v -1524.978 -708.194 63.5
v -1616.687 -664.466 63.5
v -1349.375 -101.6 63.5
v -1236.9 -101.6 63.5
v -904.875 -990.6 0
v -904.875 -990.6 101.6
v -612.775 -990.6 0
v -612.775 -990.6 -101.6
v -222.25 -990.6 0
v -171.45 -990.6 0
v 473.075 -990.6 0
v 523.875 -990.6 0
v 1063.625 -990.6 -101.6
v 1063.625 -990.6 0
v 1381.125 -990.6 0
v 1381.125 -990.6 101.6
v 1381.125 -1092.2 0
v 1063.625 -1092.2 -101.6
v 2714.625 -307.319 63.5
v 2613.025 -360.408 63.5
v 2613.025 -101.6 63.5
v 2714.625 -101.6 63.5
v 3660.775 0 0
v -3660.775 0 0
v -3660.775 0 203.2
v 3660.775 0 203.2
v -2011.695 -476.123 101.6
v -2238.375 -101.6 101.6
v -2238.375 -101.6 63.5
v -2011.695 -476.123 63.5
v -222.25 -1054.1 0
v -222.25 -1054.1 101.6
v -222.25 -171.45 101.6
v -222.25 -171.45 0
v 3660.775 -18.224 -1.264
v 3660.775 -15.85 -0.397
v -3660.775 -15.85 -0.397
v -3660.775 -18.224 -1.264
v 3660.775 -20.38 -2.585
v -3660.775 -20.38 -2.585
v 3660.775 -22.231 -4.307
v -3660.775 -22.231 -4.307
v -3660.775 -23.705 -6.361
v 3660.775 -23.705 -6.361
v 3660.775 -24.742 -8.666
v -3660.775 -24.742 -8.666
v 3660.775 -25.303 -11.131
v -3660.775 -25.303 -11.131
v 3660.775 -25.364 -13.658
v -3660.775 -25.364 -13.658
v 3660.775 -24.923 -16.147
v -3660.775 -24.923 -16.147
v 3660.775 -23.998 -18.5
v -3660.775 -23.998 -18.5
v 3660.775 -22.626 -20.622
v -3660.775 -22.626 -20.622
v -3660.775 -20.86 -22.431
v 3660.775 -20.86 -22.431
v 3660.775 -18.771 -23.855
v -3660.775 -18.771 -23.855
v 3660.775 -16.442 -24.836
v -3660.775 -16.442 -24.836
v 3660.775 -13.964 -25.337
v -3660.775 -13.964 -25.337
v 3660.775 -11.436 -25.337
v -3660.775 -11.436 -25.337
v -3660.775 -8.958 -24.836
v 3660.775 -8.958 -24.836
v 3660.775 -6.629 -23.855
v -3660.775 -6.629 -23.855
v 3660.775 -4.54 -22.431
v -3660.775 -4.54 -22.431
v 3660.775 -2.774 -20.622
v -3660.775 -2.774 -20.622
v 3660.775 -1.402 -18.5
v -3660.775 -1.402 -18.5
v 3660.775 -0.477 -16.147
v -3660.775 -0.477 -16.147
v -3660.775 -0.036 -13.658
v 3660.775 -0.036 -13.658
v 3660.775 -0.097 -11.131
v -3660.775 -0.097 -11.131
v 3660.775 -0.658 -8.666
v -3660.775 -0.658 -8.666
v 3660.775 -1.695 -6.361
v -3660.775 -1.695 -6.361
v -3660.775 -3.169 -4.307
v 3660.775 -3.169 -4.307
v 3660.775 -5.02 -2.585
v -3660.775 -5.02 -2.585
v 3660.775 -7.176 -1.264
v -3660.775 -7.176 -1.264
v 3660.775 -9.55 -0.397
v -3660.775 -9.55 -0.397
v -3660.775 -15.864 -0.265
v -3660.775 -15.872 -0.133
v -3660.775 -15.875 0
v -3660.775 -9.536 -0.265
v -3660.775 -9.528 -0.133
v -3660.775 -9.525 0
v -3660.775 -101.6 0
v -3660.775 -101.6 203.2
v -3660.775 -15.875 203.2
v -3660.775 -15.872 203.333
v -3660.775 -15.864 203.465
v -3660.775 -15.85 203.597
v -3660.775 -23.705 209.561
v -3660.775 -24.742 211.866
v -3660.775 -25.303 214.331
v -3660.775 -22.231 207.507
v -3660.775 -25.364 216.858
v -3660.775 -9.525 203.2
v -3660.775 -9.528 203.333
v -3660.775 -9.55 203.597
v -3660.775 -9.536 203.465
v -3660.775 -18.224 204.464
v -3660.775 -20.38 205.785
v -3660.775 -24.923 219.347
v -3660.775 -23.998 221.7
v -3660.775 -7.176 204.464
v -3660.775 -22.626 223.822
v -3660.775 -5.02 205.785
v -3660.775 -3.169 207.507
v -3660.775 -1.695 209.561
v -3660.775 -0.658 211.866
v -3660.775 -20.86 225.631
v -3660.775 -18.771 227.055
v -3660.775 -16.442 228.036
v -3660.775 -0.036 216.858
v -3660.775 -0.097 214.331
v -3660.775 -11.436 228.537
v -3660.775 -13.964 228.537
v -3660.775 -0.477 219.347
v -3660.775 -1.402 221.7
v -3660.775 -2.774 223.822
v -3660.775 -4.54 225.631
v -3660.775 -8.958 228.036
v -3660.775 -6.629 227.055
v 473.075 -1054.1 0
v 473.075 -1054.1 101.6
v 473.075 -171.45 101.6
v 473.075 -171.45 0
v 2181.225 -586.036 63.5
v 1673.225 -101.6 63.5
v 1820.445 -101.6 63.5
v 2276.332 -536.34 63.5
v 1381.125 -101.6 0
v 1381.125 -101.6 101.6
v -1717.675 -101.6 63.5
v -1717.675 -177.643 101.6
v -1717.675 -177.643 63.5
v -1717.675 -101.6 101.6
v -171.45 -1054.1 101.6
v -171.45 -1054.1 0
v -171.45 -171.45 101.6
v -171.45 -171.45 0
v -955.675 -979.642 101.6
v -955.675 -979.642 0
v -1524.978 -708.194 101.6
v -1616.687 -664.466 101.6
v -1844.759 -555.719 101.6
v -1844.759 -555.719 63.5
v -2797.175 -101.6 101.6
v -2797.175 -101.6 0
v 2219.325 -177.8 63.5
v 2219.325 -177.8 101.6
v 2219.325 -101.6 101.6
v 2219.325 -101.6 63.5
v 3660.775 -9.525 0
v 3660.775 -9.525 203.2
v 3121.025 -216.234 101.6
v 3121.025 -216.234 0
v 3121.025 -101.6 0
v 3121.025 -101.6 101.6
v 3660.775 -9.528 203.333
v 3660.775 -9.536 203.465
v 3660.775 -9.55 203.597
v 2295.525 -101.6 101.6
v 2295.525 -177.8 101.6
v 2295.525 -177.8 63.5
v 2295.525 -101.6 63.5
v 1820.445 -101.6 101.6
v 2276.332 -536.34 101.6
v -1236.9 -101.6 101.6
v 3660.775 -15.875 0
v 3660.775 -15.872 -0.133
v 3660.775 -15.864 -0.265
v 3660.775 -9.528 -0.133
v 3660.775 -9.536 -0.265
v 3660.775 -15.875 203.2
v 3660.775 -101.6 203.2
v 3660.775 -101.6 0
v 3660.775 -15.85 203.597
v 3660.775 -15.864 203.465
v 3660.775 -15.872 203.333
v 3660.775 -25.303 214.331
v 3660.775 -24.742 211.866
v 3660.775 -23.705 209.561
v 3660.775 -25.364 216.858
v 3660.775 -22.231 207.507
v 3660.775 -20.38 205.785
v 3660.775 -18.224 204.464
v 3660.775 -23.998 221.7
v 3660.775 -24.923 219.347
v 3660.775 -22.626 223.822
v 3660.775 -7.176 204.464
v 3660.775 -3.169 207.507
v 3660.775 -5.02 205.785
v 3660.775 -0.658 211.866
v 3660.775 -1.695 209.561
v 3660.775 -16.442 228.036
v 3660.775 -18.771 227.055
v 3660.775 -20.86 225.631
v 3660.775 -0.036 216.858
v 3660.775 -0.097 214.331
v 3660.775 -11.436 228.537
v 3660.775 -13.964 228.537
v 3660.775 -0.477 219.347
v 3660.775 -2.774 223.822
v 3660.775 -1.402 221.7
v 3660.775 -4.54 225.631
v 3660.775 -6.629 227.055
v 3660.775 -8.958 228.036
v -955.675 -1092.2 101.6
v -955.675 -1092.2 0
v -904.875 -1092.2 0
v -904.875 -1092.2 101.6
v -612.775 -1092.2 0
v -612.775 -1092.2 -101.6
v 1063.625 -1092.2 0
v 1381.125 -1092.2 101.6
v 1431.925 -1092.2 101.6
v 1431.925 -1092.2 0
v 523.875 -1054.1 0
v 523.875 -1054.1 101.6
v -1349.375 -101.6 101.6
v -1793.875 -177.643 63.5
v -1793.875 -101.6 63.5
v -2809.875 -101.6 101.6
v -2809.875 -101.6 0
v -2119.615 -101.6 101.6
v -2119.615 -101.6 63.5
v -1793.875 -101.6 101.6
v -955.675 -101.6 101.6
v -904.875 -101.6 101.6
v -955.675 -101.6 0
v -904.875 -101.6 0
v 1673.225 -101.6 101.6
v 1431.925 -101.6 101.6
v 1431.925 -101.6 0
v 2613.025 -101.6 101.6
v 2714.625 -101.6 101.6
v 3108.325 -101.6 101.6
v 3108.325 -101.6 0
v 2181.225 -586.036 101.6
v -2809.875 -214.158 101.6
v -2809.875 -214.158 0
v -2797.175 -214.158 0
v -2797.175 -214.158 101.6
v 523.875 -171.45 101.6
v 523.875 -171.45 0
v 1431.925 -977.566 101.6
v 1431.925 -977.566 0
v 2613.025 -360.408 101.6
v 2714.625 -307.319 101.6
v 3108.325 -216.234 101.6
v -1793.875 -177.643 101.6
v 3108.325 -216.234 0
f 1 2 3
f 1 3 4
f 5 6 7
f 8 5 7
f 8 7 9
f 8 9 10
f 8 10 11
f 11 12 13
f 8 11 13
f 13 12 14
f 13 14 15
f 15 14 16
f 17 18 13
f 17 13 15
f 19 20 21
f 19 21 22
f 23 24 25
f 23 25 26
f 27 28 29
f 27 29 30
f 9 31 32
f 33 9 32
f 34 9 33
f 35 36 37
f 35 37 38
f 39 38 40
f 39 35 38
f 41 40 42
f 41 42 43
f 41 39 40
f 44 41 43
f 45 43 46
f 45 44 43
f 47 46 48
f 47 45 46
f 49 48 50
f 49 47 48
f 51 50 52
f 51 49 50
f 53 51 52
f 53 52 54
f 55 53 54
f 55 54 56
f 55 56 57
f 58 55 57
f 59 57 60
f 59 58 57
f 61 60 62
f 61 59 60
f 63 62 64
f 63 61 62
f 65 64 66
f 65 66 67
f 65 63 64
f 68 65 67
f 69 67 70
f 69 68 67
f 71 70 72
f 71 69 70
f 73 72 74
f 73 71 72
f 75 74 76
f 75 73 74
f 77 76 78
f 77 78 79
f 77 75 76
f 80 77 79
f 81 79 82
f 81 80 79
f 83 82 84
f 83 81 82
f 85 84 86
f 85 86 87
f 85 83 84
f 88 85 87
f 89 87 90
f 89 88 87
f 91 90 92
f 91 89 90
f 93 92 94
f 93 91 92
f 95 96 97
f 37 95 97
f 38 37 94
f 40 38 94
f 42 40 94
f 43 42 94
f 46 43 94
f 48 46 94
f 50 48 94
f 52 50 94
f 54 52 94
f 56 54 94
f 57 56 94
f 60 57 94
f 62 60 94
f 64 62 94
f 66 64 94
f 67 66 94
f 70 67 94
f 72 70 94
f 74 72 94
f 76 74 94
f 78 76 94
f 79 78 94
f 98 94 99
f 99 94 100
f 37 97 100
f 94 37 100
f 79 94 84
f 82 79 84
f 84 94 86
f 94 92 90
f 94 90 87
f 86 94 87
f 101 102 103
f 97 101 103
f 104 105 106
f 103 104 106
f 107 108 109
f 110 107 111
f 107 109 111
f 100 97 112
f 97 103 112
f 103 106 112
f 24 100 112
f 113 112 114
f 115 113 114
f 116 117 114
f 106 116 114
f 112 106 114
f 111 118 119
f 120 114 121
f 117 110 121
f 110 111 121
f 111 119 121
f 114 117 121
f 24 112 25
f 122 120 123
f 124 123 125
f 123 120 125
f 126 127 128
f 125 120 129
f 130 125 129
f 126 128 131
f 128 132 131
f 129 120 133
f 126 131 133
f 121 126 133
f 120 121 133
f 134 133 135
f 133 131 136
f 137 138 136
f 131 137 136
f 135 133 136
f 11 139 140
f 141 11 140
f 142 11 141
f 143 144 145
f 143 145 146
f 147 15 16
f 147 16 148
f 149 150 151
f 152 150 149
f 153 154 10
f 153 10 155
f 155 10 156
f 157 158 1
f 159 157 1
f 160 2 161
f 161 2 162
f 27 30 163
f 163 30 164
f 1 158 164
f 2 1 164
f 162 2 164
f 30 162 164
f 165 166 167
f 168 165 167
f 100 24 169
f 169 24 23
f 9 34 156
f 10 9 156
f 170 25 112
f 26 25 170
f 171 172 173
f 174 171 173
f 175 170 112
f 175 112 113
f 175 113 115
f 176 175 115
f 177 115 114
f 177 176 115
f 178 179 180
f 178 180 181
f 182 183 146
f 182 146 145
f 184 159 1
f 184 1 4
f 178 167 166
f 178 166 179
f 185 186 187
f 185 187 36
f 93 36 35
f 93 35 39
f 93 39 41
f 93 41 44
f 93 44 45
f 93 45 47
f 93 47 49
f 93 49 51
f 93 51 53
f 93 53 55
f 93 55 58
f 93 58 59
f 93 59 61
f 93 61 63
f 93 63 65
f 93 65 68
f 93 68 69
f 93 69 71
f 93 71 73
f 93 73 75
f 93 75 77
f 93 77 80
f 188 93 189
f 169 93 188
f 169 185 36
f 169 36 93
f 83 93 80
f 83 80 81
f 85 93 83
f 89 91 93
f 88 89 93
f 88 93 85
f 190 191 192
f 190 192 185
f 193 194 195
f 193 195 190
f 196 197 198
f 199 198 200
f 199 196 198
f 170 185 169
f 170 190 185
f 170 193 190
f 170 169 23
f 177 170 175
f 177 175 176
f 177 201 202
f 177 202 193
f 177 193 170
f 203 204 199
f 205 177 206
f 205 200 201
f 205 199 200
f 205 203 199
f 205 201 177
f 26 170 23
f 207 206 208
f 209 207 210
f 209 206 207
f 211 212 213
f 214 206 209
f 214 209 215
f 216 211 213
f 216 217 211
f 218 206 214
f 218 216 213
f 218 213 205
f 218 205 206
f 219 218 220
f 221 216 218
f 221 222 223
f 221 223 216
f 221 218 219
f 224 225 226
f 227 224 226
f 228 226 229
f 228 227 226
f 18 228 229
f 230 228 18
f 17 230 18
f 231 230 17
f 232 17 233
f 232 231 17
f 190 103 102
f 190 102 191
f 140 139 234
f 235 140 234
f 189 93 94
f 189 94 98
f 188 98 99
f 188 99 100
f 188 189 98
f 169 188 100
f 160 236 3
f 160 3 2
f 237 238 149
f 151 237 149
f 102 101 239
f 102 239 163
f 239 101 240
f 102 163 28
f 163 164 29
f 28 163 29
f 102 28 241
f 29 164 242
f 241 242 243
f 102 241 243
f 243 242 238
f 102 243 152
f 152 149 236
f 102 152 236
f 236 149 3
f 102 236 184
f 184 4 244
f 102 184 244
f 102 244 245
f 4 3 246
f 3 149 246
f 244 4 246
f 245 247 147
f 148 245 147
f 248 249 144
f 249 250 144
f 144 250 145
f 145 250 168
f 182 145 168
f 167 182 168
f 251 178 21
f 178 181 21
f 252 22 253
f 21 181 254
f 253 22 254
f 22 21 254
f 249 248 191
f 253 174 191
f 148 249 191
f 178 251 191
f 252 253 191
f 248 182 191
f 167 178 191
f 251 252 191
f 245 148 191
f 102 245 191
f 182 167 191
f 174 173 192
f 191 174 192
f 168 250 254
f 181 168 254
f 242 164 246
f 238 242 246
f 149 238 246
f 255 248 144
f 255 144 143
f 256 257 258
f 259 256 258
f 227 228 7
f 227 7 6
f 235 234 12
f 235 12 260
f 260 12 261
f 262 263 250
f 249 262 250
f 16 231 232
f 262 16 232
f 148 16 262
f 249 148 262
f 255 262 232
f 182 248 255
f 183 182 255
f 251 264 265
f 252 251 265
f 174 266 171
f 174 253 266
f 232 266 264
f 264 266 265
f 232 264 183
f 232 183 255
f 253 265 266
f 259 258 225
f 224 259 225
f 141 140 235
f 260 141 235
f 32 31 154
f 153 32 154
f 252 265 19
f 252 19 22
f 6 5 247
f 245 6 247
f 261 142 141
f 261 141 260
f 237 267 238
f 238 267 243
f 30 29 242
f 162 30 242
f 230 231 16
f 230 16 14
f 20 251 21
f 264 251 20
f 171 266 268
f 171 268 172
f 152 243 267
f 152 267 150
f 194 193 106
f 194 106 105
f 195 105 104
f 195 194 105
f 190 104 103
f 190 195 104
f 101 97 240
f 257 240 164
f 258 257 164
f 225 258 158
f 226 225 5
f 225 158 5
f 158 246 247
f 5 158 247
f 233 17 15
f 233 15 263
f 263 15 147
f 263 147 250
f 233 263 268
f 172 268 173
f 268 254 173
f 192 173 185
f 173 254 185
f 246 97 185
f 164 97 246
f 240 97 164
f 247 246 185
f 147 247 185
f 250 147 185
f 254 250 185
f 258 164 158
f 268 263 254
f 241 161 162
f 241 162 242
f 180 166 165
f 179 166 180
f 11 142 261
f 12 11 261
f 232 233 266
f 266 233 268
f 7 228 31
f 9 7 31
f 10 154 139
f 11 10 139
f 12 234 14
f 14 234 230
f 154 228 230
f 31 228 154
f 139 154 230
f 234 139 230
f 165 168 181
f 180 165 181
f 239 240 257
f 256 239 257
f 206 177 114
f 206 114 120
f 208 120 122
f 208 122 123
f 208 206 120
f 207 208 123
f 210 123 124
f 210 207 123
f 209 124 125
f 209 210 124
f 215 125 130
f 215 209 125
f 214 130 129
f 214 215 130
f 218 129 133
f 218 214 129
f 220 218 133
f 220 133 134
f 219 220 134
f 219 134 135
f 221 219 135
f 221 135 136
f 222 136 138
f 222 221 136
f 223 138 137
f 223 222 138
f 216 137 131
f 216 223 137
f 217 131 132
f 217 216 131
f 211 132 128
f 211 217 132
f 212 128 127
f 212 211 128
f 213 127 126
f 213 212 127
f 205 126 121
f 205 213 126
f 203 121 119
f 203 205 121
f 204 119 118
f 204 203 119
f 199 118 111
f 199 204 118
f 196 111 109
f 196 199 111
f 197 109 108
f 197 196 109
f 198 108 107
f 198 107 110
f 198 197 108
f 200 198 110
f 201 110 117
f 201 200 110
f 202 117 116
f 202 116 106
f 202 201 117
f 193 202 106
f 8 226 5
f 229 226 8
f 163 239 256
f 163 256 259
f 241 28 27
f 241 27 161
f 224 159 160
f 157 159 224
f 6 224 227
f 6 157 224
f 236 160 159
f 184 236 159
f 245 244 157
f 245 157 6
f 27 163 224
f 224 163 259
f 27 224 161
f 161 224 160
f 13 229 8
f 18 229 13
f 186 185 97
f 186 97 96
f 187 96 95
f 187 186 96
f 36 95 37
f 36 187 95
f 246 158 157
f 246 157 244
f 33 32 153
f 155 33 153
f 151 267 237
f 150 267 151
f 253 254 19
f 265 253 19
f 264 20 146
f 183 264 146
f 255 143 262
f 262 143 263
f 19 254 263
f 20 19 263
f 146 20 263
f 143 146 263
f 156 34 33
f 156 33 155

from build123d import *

# Parameters (mm, degrees)
F5_W      = 7321.55
F5_H      = 101.6
F6_DEPTH  = 203.2
F8_DEPTH  = 7321.55
F9_W      = 50.8
F9_H      = 990.6
F10_DEPTH = 101.6
F11_W     = 50.8
F11_H     = 882.65
F12_DEPTH = 101.6
F14_DEPTH = 101.6
F15_W     = 1676.4
F15_H     = 101.6
F16_DEPTH = 101.6
F17_W     = 76.2
F17_H     = 76.2
F18_DEPTH = 38.1


# Not quite as in the source:
# - a variable given as a bare number and used for a length is read in inches; the dataset says mm whatever the document's units were


with BuildPart() as f6:
    # F5 (on Top) → F6 (new body)
    with BuildSketch(Plane.XY):
        with Locations((0, -50.8)):
            Rectangle(F5_W, F5_H)
    extrude(amount=F6_DEPTH)

    # F7 (on face) → F8 (join)
    with BuildSketch(Plane.YZ.offset(3660.775)):
        with BuildLine():
            ThreePointArc((-9.5499023453, 203.596875), (-2.6676463326, 208.1127103629), (0, 215.9))
            ThreePointArc((0, 215.9), (-20.4872896371, 225.9323536674), (-15.8500976547, 203.596875))
            ThreePointArc((-15.8500976547, 203.596875), (-12.7, 206.375), (-9.5499023453, 203.596875))
        make_face()
        with BuildLine():
            ThreePointArc((-12.7, 203.2), (-14.2875, 203.2996093811), (-15.8500976547, 203.596875))
            ThreePointArc((-15.8500976547, 203.596875), (-15.8687682981, 203.3988277473), (-15.875, 203.2))
            Line((-15.875, 203.2), (-12.7, 203.2))
        make_face()
        with BuildLine():
            ThreePointArc((-9.525, 203.2), (-9.5312317019, 203.3988277473), (-9.5499023453, 203.596875))
            ThreePointArc((-9.5499023453, 203.596875), (-11.1125, 203.2996093811), (-12.7, 203.2))
            Line((-12.7, 203.2), (-9.525, 203.2))
        make_face()
        with BuildLine():
            Line((-9.525, 203.2), (-12.7, 203.2))
            Line((-12.7, 203.2), (-15.875, 203.2))
            ThreePointArc((-15.875, 203.2), (-12.7, 200.025), (-9.525, 203.2))
        make_face()
        with BuildLine():
            ThreePointArc((-9.5499023453, 203.596875), (-12.7, 206.375), (-15.8500976547, 203.596875))
            ThreePointArc((-15.8500976547, 203.596875), (-14.2875, 203.2996093811), (-12.7, 203.2))
            ThreePointArc((-12.7, 203.2), (-11.1125, 203.2996093811), (-9.5499023453, 203.596875))
        make_face()
        with BuildLine():
            ThreePointArc((-9.5499023453, -0.396875), (-12.7, -3.175), (-15.8500976547, -0.396875))
            ThreePointArc((-15.8500976547, -0.396875), (-20.4872896371, -22.7323536674), (0, -12.7))
            ThreePointArc((0, -12.7), (-2.6676463326, -4.9127103629), (-9.5499023453, -0.396875))
        make_face()
        with BuildLine():
            ThreePointArc((-12.7, 0), (-14.2875, -0.0996093811), (-15.8500976547, -0.396875))
            ThreePointArc((-15.8500976547, -0.396875), (-12.7, -3.175), (-9.5499023453, -0.396875))
            ThreePointArc((-9.5499023453, -0.396875), (-11.1125, -0.0996093811), (-12.7, 0))
        make_face()
        with BuildLine():
            Line((-12.7, 0), (-15.875, 0))
            ThreePointArc((-15.875, 0), (-15.8687682981, -0.1988277473), (-15.8500976547, -0.396875))
            ThreePointArc((-15.8500976547, -0.396875), (-14.2875, -0.0996093811), (-12.7, 0))
        make_face()
        with BuildLine():
            ThreePointArc((-9.5499023453, -0.396875), (-9.5312317019, -0.1988277473), (-9.525, 0))
            Line((-9.525, 0), (-12.7, 0))
            ThreePointArc((-12.7, 0), (-11.1125, -0.0996093811), (-9.5499023453, -0.396875))
        make_face()
    extrude(amount=-F8_DEPTH)

    # F9 (on Top) → F10 (join)
    with BuildSketch(Plane.XY):
        with Locations((-930.275, -596.9)):
            Rectangle(F9_W, F9_H)
        with Locations((1406.525, -596.9)):
            Rectangle(F9_W, F9_H)
    extrude(amount=F10_DEPTH)

    # F13 (on Top) → F14 (join)
    with BuildSketch(Plane.XY):
        Polygon((-955.675, -979.6417901101), (-2797.175, -101.6), (-2809.875, -101.6), (-2809.875, -214.1582098899), (-2797.175, -214.1582098899), (-955.675, -1092.2), align=None)
        Polygon((3108.325, -101.6), (1431.925, -977.565864756), (1431.925, -1092.2), (3108.325, -216.234135244), (3121.025, -216.234135244), (3121.025, -101.6), align=None)
    extrude(amount=F14_DEPTH)



with BuildPart() as f12:
    # F11 (on Top) → F12 (new body)
    with BuildSketch(Plane.XY):
        with Locations((-196.85, -612.775)):
            Rectangle(F11_W, F11_H)
    extrude(amount=F12_DEPTH)


with BuildPart() as f12b:
    # F11 (on Top) → F12, piece 2 (new body)
    with BuildSketch(Plane.XY):
        with Locations((498.475, -612.775)):
            Rectangle(F11_W, F11_H)
    extrude(amount=F12_DEPTH)


with BuildPart() as f6_1:
    add(f6.part)

    add(f12.part)  # F16 merges F12

    add(f12b.part)  # F16 merges F12b
    # F15 (on face) → F16 (join)
    with BuildSketch(Plane.XZ.offset(1092.2)):
        Polygon((-612.775, -101.6), (-612.775, 0), (-904.875, 101.6), (-904.875, 0), align=None)
        with Locations((225.425, -50.8)):
            Rectangle(F15_W, F15_H)
        Polygon((1381.125, 101.6), (1063.625, 0), (1063.625, -101.6), (1381.125, 0), align=None)
    extrude(amount=-F16_DEPTH)

    # F17 (on face) → F18 (join)
    with BuildSketch(Plane.XY.offset(101.6)):
        Polygon((-2119.6147810739, -101.6), (-2238.375, -101.6), (-2011.695225595, -476.1229797523), (-1844.759380981, -555.7193130884), align=None)
        with Locations((-1755.775, -139.5431798935)):
            Rectangle(F17_W, F17_H)
        Polygon((-1349.375, -101.6), (-1616.686877804, -664.4660896099), (-1524.9781313366, -708.1935465292), (-1236.8995581561, -101.6), align=None)
        Polygon((2276.3318432651, -536.339683256), (1820.4451820405, -101.6), (1673.225, -101.6), (2181.225, -586.0356676302), align=None)
        with Locations((2257.425, -139.7)):
            Rectangle(F17_W, F17_H)
        Polygon((2714.625, -101.6), (2613.025, -101.6), (2613.025, -360.4080964052), (2714.625, -307.3192561169), align=None)
    extrude(amount=-F18_DEPTH)


solid = f6_1.part
